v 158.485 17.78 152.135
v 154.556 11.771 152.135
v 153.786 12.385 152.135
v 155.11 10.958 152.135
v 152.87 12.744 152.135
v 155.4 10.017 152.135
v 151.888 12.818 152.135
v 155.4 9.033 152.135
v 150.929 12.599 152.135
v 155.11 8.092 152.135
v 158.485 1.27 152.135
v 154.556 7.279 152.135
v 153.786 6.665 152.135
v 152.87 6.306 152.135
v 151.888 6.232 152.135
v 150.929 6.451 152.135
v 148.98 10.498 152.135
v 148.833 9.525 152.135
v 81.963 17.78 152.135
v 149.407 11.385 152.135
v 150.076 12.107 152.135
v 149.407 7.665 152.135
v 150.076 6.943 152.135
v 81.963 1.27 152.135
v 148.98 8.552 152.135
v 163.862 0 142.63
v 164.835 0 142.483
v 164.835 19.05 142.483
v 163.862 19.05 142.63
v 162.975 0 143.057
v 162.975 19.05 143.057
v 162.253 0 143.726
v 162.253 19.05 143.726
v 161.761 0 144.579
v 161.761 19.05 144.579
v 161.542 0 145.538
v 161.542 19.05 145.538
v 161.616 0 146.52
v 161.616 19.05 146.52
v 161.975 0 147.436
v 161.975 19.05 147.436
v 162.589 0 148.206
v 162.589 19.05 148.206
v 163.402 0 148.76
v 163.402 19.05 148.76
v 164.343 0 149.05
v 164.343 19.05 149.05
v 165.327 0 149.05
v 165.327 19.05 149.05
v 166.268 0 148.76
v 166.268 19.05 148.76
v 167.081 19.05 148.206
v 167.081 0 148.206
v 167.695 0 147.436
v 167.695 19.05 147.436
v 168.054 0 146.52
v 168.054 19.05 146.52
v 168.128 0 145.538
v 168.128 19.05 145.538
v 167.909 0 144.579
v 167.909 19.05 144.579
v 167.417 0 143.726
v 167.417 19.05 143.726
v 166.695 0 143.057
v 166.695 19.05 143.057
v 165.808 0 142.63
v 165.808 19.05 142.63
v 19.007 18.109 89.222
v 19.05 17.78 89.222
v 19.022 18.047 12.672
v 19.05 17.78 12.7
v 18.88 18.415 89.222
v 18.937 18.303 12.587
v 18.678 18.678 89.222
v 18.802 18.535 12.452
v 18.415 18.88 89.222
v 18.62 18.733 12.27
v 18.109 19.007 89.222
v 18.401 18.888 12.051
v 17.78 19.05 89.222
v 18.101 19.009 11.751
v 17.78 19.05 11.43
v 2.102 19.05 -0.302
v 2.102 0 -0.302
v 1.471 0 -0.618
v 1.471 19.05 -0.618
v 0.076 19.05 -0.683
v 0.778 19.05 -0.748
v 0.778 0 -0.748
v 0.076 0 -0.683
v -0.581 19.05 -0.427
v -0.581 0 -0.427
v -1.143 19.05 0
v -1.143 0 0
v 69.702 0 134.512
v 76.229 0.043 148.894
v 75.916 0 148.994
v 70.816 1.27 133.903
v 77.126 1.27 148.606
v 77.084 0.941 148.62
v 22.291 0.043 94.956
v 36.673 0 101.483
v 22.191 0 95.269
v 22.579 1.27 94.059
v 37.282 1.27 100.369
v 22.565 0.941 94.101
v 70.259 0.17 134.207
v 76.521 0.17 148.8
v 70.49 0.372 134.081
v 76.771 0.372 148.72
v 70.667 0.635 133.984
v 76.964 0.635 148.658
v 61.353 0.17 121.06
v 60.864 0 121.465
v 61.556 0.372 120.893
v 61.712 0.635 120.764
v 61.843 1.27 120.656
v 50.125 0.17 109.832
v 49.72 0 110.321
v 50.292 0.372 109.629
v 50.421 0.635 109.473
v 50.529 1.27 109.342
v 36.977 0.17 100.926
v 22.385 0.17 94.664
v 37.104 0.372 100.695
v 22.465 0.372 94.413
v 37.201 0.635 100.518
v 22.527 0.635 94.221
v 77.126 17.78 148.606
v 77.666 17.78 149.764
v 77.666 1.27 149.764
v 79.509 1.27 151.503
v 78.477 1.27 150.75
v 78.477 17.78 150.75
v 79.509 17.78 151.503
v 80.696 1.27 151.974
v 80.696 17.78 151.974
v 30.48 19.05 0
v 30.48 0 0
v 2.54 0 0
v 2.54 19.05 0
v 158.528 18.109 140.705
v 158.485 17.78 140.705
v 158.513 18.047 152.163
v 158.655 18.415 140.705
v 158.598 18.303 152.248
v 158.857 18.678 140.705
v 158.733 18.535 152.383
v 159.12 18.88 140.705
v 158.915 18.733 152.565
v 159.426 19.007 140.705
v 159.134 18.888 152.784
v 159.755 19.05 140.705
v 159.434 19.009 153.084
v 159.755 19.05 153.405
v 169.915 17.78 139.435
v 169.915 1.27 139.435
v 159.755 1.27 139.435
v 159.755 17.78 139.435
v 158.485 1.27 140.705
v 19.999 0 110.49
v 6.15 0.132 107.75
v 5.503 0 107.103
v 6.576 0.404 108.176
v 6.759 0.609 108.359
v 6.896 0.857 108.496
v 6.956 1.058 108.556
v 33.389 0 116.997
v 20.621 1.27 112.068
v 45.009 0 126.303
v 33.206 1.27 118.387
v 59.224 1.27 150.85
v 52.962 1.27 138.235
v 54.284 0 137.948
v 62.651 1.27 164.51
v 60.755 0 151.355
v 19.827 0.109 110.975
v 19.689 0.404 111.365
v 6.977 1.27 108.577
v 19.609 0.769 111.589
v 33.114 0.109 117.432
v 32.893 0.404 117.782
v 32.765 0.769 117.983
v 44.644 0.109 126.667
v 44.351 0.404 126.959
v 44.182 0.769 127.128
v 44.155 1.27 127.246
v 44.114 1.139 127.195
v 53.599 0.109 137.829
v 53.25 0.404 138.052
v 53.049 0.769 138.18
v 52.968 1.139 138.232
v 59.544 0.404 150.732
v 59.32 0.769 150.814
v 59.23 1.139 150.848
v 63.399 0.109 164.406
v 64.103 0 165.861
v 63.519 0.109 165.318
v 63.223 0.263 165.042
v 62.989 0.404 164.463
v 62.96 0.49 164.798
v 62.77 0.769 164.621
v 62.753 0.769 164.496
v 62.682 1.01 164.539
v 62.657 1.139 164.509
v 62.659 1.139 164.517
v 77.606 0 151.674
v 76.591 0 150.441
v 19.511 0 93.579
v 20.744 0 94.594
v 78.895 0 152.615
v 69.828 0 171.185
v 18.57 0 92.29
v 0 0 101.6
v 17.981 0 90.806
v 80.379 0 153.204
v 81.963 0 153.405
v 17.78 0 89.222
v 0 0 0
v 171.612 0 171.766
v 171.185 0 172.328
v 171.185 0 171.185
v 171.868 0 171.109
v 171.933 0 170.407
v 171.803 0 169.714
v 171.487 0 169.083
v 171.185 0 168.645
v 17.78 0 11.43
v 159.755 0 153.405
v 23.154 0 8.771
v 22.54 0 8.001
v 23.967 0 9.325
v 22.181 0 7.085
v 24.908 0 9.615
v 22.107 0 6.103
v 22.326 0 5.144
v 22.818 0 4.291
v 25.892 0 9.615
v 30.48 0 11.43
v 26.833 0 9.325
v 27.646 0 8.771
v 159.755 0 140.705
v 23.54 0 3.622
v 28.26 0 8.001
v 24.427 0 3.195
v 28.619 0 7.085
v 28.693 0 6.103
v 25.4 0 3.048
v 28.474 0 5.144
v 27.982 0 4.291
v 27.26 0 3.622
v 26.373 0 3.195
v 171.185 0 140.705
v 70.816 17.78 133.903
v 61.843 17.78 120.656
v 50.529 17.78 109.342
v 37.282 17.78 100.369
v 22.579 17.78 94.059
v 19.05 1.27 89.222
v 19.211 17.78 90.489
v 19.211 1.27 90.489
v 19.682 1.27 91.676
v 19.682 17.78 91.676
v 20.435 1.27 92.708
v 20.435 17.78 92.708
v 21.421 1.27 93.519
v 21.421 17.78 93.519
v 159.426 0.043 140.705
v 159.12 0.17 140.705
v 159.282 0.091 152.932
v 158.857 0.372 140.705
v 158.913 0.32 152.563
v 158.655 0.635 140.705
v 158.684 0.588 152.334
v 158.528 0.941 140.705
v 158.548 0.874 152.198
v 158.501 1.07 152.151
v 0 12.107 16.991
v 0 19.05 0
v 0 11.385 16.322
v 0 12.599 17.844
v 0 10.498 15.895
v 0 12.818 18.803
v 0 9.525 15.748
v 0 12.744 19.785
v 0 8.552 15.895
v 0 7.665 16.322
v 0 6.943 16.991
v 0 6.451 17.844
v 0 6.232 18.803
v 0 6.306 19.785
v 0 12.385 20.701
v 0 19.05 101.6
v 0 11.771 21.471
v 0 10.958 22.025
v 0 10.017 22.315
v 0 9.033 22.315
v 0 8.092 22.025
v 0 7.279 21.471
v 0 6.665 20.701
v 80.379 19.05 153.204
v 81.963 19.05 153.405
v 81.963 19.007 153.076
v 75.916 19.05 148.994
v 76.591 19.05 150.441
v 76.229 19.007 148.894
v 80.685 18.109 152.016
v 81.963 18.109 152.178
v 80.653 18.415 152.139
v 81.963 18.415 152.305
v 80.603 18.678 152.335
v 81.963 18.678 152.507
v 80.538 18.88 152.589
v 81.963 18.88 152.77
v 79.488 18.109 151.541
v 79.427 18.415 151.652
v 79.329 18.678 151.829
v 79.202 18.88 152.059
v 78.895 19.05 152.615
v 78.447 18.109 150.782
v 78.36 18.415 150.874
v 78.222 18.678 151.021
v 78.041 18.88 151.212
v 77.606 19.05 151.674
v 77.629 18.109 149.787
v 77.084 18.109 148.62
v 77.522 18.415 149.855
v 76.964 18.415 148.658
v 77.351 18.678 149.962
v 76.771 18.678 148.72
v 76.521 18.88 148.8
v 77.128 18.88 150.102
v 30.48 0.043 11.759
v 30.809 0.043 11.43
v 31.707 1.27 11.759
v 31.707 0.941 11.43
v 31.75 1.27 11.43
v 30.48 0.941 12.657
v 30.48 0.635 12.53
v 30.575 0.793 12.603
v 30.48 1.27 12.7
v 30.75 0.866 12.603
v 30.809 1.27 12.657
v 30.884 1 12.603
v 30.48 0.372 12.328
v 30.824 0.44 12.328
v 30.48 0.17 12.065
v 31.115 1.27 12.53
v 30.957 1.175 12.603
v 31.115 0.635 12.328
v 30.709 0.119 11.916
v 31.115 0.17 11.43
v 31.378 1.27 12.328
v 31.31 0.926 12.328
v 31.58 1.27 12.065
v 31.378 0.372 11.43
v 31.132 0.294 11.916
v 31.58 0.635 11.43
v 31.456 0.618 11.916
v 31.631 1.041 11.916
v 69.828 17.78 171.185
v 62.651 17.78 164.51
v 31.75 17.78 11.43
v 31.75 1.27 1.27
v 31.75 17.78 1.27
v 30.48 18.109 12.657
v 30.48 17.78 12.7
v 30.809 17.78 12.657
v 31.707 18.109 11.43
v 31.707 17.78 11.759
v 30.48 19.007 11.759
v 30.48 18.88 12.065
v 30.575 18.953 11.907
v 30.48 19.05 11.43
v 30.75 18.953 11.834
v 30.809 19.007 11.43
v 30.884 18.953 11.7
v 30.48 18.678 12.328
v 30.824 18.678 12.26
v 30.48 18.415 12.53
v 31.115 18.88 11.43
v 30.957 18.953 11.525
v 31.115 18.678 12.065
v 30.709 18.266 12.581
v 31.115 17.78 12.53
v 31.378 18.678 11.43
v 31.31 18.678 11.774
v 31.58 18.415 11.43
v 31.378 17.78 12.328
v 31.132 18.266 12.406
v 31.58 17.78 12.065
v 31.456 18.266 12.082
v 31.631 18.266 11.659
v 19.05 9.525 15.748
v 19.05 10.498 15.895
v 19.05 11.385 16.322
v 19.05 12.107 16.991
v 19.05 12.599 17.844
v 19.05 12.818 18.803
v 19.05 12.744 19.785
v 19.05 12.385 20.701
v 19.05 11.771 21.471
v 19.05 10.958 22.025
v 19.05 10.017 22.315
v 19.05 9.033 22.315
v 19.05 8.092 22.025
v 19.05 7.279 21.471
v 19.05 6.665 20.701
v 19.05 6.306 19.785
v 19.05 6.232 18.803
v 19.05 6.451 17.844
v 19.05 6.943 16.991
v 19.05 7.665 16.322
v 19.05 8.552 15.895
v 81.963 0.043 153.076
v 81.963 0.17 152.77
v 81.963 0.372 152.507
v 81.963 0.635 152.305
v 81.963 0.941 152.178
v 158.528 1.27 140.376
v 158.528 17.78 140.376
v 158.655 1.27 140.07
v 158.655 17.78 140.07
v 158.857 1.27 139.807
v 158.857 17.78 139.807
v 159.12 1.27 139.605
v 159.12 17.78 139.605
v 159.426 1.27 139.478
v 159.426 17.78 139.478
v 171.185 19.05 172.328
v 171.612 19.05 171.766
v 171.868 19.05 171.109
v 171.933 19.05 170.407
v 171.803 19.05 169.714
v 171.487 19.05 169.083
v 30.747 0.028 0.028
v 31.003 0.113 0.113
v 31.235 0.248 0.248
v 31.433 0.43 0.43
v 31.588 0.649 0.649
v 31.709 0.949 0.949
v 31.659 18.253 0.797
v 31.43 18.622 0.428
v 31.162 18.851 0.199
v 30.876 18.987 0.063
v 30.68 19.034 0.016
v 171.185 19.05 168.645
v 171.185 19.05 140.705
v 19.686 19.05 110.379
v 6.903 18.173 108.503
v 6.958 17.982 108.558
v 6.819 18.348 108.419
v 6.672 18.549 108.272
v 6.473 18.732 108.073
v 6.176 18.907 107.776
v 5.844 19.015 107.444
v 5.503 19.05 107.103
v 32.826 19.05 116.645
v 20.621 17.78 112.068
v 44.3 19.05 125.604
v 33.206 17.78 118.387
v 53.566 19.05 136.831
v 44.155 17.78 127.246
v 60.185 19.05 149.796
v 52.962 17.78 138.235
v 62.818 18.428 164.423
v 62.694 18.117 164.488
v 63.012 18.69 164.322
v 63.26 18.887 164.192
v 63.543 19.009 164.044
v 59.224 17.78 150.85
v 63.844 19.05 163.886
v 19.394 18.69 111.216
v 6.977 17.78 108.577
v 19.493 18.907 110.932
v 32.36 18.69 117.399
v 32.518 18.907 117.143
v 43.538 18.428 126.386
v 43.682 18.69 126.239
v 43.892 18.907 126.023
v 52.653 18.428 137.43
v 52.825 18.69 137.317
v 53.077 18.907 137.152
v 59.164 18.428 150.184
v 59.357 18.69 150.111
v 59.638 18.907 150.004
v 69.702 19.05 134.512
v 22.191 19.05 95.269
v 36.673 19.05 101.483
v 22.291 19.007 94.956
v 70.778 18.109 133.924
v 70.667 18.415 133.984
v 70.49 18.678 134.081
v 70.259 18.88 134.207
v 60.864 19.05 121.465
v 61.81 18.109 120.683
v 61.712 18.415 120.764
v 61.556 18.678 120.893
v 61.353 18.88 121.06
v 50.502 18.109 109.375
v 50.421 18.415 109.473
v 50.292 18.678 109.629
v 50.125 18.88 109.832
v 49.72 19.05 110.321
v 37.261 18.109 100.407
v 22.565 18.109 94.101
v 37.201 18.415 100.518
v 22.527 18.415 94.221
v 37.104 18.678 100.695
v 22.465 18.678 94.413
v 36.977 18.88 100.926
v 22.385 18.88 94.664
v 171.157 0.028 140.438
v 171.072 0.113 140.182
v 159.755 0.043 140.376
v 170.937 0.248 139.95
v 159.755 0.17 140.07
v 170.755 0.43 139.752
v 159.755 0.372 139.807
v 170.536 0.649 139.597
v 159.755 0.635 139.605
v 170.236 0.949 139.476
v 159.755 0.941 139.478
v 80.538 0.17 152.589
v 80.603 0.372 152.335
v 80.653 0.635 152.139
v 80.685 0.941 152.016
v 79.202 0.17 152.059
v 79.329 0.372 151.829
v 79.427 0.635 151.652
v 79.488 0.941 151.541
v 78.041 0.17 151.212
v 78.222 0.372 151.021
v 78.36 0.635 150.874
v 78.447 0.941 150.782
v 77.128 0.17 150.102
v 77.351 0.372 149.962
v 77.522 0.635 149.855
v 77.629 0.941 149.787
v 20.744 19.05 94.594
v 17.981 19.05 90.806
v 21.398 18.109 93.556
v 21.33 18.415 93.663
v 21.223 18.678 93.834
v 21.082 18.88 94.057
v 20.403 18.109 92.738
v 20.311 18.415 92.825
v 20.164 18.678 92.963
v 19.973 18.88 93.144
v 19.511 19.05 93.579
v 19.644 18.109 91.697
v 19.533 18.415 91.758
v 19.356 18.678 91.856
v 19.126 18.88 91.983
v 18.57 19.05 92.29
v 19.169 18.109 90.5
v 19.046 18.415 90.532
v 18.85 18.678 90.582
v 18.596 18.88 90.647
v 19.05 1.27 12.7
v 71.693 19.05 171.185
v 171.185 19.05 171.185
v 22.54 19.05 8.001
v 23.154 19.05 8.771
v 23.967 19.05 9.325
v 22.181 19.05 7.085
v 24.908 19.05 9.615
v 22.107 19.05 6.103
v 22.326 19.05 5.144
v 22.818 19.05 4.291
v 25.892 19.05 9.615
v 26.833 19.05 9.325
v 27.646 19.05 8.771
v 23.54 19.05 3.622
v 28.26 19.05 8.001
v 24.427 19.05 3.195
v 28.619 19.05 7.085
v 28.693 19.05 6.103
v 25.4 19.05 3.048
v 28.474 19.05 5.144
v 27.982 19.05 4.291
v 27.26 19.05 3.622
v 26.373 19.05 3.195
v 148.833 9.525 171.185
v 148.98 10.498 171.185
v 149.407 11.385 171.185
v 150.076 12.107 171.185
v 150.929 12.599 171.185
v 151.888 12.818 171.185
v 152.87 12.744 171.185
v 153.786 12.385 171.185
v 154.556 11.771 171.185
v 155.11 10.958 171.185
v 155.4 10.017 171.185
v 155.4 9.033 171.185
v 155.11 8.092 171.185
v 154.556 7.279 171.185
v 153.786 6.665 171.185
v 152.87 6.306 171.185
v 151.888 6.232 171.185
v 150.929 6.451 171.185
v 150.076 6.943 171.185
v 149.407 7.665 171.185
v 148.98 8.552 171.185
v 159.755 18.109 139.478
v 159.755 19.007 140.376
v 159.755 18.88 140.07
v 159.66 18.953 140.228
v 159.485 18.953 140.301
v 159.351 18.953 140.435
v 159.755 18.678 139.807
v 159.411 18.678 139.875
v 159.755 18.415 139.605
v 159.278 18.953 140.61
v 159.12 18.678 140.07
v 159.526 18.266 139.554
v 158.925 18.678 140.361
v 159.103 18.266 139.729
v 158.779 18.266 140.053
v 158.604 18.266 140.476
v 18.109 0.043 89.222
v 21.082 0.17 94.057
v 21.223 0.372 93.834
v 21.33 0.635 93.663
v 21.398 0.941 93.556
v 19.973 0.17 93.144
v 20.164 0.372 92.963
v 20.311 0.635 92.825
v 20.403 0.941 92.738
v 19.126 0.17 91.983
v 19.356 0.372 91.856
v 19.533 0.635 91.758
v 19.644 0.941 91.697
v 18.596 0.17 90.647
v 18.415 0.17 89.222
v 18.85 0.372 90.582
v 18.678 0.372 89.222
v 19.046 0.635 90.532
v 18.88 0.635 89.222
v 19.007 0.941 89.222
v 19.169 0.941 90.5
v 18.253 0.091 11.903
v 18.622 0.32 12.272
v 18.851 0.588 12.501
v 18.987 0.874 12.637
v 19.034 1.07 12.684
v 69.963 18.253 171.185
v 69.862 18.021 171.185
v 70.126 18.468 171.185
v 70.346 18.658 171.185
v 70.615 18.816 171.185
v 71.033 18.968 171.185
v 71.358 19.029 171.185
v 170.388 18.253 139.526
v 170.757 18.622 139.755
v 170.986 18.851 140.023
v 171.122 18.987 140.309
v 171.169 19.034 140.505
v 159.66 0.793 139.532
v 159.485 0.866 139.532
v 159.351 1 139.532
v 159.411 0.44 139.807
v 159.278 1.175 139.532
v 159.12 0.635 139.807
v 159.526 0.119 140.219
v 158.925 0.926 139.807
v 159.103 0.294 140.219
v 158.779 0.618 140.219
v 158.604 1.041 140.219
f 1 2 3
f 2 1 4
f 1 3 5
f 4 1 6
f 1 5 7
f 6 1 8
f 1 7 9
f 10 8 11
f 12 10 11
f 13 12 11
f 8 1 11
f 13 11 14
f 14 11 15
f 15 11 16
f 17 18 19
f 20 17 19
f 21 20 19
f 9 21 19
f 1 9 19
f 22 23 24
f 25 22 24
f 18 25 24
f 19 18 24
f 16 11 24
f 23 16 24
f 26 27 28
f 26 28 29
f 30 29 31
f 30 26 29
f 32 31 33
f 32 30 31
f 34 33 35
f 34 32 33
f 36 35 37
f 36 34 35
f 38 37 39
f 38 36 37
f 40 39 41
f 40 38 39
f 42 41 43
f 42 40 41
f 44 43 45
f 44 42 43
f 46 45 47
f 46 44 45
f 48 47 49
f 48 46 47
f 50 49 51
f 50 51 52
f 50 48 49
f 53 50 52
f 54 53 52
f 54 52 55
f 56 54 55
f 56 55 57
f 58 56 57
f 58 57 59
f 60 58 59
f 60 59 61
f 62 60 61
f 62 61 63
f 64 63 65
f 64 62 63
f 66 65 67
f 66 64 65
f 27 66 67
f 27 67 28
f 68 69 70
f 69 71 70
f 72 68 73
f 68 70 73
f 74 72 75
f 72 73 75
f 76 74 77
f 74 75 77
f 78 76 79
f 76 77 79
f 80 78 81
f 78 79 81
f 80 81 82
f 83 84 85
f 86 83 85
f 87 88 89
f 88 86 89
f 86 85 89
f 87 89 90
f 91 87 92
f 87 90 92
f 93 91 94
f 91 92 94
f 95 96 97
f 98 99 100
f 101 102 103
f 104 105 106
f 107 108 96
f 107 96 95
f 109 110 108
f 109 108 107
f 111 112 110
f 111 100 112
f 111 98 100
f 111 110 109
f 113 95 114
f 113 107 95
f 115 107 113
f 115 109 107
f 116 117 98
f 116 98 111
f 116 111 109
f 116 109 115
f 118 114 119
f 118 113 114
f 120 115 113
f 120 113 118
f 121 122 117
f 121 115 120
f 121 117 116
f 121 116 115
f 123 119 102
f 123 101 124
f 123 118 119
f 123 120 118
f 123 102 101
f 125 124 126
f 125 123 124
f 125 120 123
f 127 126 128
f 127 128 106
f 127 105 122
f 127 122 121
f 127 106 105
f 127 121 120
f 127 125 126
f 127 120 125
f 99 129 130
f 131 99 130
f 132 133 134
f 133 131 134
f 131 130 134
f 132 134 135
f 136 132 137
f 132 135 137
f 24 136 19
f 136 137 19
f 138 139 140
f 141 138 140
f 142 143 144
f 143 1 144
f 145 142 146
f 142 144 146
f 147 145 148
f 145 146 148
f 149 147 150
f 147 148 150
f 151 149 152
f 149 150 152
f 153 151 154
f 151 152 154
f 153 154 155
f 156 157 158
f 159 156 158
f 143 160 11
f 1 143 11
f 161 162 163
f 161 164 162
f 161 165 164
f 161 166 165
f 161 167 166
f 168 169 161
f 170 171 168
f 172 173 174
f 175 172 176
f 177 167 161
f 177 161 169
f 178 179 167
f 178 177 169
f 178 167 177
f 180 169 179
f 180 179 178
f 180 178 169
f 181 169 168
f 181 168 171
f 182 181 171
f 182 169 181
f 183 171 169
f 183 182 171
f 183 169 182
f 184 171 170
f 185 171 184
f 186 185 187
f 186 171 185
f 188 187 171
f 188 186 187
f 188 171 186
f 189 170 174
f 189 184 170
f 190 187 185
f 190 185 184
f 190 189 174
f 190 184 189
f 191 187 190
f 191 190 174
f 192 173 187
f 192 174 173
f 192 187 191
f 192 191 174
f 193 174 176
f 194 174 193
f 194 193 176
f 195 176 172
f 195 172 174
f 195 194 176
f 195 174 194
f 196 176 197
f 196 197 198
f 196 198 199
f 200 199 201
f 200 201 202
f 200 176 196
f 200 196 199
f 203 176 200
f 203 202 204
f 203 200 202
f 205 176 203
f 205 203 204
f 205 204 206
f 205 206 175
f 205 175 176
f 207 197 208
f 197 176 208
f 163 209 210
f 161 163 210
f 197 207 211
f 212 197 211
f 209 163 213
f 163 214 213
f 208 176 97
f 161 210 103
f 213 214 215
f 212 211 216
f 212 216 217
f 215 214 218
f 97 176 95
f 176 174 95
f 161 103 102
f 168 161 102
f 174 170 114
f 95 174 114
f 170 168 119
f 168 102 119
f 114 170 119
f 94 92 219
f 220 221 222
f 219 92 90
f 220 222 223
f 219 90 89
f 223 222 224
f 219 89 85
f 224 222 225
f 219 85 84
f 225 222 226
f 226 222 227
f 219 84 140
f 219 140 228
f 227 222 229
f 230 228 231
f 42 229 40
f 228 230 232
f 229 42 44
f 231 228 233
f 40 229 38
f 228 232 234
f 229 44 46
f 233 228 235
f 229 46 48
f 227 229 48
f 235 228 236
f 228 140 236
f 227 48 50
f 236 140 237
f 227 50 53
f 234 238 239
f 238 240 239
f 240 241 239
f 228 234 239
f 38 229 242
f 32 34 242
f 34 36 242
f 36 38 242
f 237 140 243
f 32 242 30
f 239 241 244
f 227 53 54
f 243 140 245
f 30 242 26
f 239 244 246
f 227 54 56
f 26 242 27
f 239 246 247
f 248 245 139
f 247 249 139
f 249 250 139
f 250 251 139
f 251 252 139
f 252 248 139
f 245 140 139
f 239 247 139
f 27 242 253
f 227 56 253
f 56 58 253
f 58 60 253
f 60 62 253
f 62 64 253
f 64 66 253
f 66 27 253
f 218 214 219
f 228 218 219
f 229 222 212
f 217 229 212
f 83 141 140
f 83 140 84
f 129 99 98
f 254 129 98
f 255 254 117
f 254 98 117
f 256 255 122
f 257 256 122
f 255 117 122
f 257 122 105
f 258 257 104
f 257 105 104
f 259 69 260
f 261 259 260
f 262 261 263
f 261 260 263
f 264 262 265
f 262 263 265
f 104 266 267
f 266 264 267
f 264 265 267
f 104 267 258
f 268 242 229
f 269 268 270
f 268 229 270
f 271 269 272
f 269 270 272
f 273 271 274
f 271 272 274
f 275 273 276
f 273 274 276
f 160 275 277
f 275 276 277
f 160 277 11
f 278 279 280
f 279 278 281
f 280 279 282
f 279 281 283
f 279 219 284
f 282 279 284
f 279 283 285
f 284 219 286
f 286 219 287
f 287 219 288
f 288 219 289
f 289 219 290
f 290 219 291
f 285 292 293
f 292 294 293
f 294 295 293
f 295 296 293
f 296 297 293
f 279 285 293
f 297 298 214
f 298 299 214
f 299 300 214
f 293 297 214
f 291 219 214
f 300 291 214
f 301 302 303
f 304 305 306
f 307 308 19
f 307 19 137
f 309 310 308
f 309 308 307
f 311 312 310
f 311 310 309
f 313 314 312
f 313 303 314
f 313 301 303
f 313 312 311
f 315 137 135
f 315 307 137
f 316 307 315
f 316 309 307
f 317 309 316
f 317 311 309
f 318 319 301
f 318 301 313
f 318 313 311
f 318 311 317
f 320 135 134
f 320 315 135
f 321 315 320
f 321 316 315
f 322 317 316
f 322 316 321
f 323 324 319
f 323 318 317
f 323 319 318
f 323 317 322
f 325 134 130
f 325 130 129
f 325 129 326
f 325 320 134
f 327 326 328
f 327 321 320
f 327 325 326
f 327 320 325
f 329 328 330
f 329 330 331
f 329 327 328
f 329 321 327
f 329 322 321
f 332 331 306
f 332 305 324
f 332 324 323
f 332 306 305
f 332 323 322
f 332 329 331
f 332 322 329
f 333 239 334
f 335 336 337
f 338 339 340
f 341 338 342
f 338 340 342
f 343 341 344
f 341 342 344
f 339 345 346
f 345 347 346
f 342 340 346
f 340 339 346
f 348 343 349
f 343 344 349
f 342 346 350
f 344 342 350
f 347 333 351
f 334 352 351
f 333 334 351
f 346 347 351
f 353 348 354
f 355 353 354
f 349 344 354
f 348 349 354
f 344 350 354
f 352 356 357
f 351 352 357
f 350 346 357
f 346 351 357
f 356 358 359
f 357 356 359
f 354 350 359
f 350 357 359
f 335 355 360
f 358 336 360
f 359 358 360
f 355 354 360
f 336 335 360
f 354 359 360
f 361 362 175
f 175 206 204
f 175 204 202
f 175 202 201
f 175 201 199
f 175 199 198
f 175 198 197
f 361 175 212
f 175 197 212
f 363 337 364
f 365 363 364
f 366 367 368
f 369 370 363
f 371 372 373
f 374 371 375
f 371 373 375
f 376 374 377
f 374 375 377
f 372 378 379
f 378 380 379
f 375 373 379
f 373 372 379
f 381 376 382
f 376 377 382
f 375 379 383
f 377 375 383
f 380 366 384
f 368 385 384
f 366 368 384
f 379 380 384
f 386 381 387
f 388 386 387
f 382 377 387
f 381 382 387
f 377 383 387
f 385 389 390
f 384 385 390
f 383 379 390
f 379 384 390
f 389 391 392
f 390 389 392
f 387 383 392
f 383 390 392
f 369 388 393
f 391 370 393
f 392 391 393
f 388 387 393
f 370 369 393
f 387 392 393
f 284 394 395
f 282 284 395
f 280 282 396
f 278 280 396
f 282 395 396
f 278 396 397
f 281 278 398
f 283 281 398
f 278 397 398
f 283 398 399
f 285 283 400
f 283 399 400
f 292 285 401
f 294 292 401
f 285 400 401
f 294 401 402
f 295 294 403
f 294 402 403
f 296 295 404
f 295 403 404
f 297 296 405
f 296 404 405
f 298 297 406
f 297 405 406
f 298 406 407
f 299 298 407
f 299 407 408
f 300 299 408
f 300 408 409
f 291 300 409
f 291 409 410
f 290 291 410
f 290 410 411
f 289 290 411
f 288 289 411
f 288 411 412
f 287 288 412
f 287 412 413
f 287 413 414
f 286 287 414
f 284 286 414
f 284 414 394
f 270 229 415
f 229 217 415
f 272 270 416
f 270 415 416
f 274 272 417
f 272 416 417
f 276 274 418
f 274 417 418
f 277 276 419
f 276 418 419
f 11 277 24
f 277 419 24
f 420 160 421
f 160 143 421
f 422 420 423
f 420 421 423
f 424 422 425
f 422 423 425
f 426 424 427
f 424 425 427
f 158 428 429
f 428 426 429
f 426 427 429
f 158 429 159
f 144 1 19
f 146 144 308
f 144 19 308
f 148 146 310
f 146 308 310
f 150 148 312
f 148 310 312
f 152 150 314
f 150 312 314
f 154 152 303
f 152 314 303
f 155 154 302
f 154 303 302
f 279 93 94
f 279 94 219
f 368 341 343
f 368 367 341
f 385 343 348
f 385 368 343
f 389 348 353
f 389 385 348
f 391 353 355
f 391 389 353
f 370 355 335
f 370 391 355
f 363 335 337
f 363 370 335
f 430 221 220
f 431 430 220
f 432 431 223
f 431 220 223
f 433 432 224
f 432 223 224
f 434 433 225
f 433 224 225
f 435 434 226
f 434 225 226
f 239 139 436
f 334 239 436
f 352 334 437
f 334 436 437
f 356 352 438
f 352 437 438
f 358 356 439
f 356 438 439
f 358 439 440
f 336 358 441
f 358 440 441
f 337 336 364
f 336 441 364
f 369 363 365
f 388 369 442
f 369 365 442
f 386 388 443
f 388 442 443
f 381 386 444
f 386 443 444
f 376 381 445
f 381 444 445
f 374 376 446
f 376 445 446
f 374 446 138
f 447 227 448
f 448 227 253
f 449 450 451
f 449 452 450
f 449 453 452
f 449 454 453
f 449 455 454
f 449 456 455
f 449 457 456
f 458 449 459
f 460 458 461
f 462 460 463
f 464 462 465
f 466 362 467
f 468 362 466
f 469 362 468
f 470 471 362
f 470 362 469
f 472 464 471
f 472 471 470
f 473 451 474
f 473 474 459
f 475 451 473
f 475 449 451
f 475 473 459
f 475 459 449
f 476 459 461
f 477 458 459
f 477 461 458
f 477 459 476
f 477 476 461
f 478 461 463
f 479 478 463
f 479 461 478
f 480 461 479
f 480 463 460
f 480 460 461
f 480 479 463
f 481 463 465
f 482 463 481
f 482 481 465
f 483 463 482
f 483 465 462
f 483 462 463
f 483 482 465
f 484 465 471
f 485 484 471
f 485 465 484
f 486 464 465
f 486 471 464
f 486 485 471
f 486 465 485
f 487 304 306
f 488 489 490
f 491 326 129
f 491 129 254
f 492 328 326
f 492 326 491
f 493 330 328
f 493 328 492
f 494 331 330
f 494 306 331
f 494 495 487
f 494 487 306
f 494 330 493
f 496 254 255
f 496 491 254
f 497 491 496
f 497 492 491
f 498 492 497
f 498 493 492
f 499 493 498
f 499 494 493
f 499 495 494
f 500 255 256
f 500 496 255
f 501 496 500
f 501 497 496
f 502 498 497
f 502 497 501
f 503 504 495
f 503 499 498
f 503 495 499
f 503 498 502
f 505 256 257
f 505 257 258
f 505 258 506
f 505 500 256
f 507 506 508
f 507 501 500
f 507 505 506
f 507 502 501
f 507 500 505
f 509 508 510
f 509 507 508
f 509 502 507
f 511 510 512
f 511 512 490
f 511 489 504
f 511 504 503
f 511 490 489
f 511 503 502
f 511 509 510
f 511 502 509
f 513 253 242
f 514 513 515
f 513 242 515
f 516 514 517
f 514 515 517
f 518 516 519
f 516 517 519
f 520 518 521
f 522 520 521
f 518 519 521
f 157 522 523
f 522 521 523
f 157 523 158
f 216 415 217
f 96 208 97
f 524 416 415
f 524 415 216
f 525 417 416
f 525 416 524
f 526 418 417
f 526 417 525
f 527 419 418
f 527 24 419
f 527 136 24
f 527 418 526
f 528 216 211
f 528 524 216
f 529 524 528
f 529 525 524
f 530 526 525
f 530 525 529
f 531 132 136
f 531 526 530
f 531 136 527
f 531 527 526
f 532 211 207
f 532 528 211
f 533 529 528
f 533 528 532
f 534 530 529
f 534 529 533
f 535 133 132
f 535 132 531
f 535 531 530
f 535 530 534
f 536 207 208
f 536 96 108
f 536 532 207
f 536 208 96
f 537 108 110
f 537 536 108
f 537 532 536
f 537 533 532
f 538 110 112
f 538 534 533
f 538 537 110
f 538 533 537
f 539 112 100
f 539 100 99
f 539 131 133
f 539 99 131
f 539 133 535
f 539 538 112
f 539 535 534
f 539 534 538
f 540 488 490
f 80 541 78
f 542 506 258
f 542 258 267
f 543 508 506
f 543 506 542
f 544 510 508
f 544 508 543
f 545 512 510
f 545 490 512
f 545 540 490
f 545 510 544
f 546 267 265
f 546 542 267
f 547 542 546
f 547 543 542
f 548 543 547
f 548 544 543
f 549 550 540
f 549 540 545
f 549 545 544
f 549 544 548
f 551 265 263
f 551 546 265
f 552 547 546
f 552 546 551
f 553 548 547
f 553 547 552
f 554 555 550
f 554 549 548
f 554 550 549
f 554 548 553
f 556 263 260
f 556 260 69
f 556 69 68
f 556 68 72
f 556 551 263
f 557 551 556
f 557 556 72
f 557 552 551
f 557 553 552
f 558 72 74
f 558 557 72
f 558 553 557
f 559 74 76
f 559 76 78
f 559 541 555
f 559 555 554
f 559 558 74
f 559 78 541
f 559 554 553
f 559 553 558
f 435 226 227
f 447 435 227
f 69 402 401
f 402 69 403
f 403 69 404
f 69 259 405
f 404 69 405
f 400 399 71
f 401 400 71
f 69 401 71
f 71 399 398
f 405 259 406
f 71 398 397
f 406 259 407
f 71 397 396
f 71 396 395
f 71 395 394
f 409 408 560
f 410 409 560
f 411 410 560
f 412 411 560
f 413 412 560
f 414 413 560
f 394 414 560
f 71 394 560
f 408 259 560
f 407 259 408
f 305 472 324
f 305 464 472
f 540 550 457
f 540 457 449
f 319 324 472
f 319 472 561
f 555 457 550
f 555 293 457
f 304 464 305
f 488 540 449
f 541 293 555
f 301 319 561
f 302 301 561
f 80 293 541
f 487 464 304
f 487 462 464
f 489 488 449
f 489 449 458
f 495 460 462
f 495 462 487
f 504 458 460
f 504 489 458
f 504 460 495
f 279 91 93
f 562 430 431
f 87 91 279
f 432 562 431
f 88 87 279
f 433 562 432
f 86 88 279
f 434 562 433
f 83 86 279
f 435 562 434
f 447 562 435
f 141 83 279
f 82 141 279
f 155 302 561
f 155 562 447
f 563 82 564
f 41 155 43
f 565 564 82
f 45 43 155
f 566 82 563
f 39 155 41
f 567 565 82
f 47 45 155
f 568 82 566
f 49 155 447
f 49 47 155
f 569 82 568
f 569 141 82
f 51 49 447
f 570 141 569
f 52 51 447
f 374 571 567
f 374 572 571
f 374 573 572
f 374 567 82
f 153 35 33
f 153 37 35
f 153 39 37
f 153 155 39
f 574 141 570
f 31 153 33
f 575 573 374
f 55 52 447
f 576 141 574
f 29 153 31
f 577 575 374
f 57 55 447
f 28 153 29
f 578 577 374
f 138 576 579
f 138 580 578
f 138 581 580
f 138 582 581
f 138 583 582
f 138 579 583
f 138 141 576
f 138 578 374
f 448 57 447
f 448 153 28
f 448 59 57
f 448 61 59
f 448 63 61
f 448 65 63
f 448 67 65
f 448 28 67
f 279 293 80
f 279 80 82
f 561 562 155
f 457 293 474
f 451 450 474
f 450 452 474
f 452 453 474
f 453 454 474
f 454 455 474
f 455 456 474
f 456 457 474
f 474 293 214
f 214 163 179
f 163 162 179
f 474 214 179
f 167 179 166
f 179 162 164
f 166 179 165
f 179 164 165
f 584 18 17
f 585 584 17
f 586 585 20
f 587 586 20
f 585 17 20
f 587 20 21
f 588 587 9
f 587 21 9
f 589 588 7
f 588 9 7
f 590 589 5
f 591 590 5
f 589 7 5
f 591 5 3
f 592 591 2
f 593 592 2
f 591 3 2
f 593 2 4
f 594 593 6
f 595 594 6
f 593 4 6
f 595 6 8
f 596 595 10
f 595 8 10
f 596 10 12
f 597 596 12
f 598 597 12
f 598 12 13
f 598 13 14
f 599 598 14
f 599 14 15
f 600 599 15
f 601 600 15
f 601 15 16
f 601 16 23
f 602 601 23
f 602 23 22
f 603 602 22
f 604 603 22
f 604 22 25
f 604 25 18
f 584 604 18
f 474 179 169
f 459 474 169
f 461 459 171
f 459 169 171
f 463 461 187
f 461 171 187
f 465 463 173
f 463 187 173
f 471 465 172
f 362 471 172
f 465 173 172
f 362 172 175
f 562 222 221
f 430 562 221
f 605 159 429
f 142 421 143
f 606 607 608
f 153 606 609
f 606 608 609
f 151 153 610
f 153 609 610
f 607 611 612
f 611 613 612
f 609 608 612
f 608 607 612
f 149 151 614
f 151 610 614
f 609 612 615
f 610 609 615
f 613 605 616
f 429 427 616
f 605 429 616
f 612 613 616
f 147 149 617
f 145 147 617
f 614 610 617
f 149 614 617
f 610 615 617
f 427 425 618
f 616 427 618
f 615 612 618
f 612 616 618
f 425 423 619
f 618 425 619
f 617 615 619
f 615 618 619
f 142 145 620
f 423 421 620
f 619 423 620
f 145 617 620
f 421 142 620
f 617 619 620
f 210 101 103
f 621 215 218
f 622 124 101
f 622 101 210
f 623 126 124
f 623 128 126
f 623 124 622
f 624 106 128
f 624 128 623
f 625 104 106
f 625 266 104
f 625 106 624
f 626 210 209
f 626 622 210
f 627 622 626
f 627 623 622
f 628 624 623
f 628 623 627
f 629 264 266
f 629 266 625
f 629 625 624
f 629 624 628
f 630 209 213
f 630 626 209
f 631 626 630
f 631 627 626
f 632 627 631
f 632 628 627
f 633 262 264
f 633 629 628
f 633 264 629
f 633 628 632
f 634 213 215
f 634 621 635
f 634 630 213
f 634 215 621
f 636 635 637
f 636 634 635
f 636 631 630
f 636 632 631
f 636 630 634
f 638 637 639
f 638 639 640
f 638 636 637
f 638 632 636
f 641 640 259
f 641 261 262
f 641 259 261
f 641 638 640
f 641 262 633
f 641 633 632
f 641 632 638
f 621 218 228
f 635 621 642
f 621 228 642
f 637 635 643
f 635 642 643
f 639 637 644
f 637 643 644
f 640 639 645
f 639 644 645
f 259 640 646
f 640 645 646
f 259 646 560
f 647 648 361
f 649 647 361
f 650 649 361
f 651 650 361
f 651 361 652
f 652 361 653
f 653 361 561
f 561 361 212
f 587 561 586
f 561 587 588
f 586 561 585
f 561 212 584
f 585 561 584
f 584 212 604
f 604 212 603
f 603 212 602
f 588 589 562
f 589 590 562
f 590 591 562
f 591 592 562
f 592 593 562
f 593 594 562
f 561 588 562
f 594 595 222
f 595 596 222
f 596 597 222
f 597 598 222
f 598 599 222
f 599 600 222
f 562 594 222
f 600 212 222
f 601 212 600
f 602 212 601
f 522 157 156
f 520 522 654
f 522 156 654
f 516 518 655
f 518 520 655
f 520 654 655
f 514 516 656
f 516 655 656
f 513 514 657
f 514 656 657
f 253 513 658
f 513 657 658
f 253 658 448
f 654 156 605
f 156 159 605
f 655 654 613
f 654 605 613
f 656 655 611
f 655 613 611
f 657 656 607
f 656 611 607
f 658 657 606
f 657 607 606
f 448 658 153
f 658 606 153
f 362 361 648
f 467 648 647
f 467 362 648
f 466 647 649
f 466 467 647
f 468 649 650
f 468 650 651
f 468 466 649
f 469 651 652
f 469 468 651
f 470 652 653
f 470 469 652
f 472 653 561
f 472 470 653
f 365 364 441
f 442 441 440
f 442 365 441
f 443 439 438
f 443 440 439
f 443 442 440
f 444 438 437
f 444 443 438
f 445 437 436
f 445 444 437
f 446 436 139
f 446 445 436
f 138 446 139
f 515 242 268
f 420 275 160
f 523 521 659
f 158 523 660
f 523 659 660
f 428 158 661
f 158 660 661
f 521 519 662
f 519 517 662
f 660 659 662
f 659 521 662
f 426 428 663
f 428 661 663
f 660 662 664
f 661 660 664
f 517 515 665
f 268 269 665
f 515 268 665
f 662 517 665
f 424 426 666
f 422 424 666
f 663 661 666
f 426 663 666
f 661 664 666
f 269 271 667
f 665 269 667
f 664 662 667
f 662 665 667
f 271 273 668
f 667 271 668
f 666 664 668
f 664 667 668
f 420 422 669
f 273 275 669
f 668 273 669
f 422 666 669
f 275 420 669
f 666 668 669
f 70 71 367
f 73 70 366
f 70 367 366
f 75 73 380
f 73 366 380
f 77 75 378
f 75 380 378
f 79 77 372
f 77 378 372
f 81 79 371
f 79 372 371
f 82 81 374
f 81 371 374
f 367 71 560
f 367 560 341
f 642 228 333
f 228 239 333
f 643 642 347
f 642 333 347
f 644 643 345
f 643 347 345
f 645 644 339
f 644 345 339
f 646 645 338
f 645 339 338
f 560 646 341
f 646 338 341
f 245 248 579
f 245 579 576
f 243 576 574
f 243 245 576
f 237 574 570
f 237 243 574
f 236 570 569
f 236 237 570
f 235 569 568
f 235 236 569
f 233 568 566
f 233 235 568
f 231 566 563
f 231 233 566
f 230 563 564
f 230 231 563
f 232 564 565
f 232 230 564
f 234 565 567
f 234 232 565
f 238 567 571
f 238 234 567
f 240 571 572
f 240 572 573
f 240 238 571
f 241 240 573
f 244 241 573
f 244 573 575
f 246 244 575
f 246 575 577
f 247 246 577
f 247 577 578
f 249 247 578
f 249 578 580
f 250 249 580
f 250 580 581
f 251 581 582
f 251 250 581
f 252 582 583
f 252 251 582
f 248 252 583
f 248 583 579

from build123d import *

# Parameters (mm, degrees)
SKETCH1_R           = 3.302
BOSS_EXTRUDE1_DEPTH = 19.05
CHAMFER1_SIZE       = 6.593417442
CHAMFER1_SIZE_2     = 6.35
FILLET1_R           = 5.08
FILLET2_R           = 1.27
CUT_EXTRUDE3_REACH  = 234.345
SKETCH4_R           = 3.302
CUT_EXTRUDE4_REACH  = 235.383
SKETCH5_R           = 3.302
FILLET27_R          = 2.54


with BuildPart() as part:
    # Sketch1 → Boss-Extrude1 (new body)
    with BuildSketch(Plane(origin=(0, 0, 0), x_dir=(1, 0, 0), z_dir=(0, 1, 0))):
        with BuildLine():
            Line((0, 0), (0, -107.95))
            ThreePointArc((0, -107.95), (44.047088178, -127.137896363), (63.234984541, -171.184984541))
            Line((63.234984541, -171.184984541), (171.184984541, -171.184984541))
            Line((171.184984541, -171.184984541), (171.184984541, -172.327984541))
            Line((171.184984541, -172.327984541), (173.724984541, -172.327984541))
            Line((173.724984541, -172.327984541), (171.184984541, -168.644984541))
            Line((171.184984541, -168.644984541), (171.184984541, -139.434984541))
            Line((171.184984541, -139.434984541), (158.484984541, -139.434984541))
            Line((158.484984541, -139.434984541), (158.484984541, -152.134984541))
            Line((158.484984541, -152.134984541), (78.172986392, -152.134984541))
            ThreePointArc((78.172986392, -152.134984541), (56.455029962, -114.729954579), (19.05, -93.011998149))
            Line((19.05, -93.011998149), (19.05, -12.7))
            Line((19.05, -12.7), (31.75, -12.7))
            Line((31.75, -12.7), (31.75, 0))
            Line((31.75, 0), (2.54, 0))
            Line((2.54, 0), (-1.143, 2.54))
            Line((-1.143, 2.54), (-1.143, 0))
            Line((-1.143, 0), (0, 0))
        make_face()
        with Locations(Location((25.4, -6.35, 0), (0, 0, 90))):
            Circle(SKETCH1_R, mode=Mode.SUBTRACT)
        with Locations(Location((164.834984541, -145.784984541, 0), (0, 0, 90))):
            Circle(SKETCH1_R, mode=Mode.SUBTRACT)
    extrude(amount=BOSS_EXTRUDE1_DEPTH)

    # Chamfer1
    # the kernel refuses this chamfer: 6.593417442, 6.35 mm, written as the material it takes off along each edge
    with BuildSketch(Plane(origin=(63.234984541, -17.246656522, 171.184984541), x_dir=(-0.08720585159632499, 0, -0.9961903128656491), z_dir=(0, 1, 0))) as chamfer1_piece_1:
        with BuildLine():
            Line((6.700635555, 0), (-CHAMFER1_SIZE * 0.0872058515927, -CHAMFER1_SIZE * 0.996190312824))
            Line((-CHAMFER1_SIZE * 0.0872058515927, -CHAMFER1_SIZE * 0.996190312824), (0, 0))
            ThreePointArc((0, 0), (3.448459053, -0.085459063), (6.700635555, 0))
        make_face()
    extrude(amount=53.543313044, mode=Mode.SUBTRACT)
    with BuildSketch(Plane(origin=(0, -18.02411909, 107.95), x_dir=(0, 0, -1), z_dir=(0, 1, 0))) as chamfer1_piece_2:
        with BuildLine():
            Line((CHAMFER1_SIZE_2, 0), (-0.627104296, -6.977104296))
            ThreePointArc((-0.627104296, -6.977104296), (-0.229600221, -3.597999822), (0, 0))
            Line((0, 0), (CHAMFER1_SIZE_2, 0))
        make_face()
    extrude(amount=55.098238181, mode=Mode.SUBTRACT)

    # Fillet1
    fillet1_edges = [part.edges().sort_by_distance(p)[0] for p in [
        (19.05, 9.525, 93.011998149),
        (78.172986392, 9.525, 152.134984541),
    ]]
    fillet(fillet1_edges, radius=FILLET1_R)

    # Fillet2
    fillet2_edges = [part.edges().sort_by_distance(p)[0] for p in [
        (31.75, 0, 6.35),
        (25.4, 0, 12.7),
        (120.223999201, 0, 152.134984541),
        (158.484984541, 0, 145.784984541),
        (164.834984541, 0, 139.434984541),
        (31.75, 9.525, 0),
        (31.75, 9.525, 12.7),
        (158.484984541, 9.525, 139.434984541),
        (171.184984541, 9.525, 139.434984541),
        (164.834984541, 19.05, 139.434984541),
        (158.484984541, 19.05, 145.784984541),
        (120.223999201, 19.05, 152.134984541),
        (44.154800127, 0, 127.245858784),
        (44.154800127, 19.05, 127.245858784),
        (25.4, 19.05, 12.7),
        (66.239525947, 19.05, 167.847430426),
        (31.75, 19.05, 6.35),
        (56.455029962, 0, 114.729954579),
        (56.455029962, 19.05, 114.729954579),
        (19.05, 0, 50.96098534),
        (19.05, 19.05, 50.96098534),
        (78.969227792, 0, 151.159085536),
        (78.969227792, 19.05, 151.159085536),
        (20.025899005, 0, 92.215756749),
        (20.025899005, 19.05, 92.215756749),
    ]]
    fillet(fillet2_edges, radius=FILLET2_R)

    # Sketch4 → Cut-Extrude3 (cut, up to next)
    with BuildSketch(Plane(origin=(19.05, 0, 0), x_dir=(0, 0, -1), z_dir=(1, 0, 0)), mode=Mode.PRIVATE) as cut_extrude3_sk1:
        with Locations((-19.05, 9.525)):
            Circle(SKETCH4_R)
    cut_extrude3_tool1 = extrude(cut_extrude3_sk1.sketch, amount=-CUT_EXTRUDE3_REACH, mode=Mode.PRIVATE) & part.part
    add(cut_extrude3_tool1.solids().sort_by_distance((19.05, 9.525, 19.05))[0], mode=Mode.SUBTRACT)

    # Sketch5 → Cut-Extrude4 (cut, up to next)
    with BuildSketch(Plane(origin=(0, 0, 152.134984541), x_dir=(-1, 0, 0), z_dir=(0, 0, -1)), mode=Mode.PRIVATE) as cut_extrude4_sk1:
        with Locations((-152.134984541, 9.525)):
            Circle(SKETCH5_R)
    cut_extrude4_tool1 = extrude(cut_extrude4_sk1.sketch, amount=-CUT_EXTRUDE4_REACH, mode=Mode.PRIVATE) & part.part
    add(cut_extrude4_tool1.solids().sort_by_distance((152.134985, 9.525, 152.134985))[0], mode=Mode.SUBTRACT)

    # Fillet27
    # the kernel refuses this fillet: 2.54 mm, written as the material it takes off along each edge
    with BuildSketch(Plane(origin=(-1.143, -9.855086022, -2.54), x_dir=(0, 0, 1), z_dir=(0, 1, 0))) as fillet27_piece_1:
        with BuildLine():
            CenterArc((4.328983323, 1.80309142), FILLET27_R, 145.407711312, 79.817320271)
            Line((2.238022847, 3.245133128), (0, 0))
            Line((0, 0), (2.54, 0))
        make_face()
    extrude(amount=38.760172045, mode=Mode.SUBTRACT)
    with BuildSketch(Plane(origin=(173.724984541, -9.855086022, 172.327984541), x_dir=(-0.5677329558036515, 0, -0.8232127859153119), z_dir=(0, 1, 0))) as fillet27_piece_2:
        with BuildLine():
            CenterArc((3.942034409, 2.54), FILLET27_R, 190.182679729, 79.817320271)
            Line((1.442041708, 2.090960476), (0, 0))
            Line((0, 0), (3.942034409, 0))
        make_face()
    extrude(amount=38.760172045, mode=Mode.SUBTRACT)


solid = part.part
